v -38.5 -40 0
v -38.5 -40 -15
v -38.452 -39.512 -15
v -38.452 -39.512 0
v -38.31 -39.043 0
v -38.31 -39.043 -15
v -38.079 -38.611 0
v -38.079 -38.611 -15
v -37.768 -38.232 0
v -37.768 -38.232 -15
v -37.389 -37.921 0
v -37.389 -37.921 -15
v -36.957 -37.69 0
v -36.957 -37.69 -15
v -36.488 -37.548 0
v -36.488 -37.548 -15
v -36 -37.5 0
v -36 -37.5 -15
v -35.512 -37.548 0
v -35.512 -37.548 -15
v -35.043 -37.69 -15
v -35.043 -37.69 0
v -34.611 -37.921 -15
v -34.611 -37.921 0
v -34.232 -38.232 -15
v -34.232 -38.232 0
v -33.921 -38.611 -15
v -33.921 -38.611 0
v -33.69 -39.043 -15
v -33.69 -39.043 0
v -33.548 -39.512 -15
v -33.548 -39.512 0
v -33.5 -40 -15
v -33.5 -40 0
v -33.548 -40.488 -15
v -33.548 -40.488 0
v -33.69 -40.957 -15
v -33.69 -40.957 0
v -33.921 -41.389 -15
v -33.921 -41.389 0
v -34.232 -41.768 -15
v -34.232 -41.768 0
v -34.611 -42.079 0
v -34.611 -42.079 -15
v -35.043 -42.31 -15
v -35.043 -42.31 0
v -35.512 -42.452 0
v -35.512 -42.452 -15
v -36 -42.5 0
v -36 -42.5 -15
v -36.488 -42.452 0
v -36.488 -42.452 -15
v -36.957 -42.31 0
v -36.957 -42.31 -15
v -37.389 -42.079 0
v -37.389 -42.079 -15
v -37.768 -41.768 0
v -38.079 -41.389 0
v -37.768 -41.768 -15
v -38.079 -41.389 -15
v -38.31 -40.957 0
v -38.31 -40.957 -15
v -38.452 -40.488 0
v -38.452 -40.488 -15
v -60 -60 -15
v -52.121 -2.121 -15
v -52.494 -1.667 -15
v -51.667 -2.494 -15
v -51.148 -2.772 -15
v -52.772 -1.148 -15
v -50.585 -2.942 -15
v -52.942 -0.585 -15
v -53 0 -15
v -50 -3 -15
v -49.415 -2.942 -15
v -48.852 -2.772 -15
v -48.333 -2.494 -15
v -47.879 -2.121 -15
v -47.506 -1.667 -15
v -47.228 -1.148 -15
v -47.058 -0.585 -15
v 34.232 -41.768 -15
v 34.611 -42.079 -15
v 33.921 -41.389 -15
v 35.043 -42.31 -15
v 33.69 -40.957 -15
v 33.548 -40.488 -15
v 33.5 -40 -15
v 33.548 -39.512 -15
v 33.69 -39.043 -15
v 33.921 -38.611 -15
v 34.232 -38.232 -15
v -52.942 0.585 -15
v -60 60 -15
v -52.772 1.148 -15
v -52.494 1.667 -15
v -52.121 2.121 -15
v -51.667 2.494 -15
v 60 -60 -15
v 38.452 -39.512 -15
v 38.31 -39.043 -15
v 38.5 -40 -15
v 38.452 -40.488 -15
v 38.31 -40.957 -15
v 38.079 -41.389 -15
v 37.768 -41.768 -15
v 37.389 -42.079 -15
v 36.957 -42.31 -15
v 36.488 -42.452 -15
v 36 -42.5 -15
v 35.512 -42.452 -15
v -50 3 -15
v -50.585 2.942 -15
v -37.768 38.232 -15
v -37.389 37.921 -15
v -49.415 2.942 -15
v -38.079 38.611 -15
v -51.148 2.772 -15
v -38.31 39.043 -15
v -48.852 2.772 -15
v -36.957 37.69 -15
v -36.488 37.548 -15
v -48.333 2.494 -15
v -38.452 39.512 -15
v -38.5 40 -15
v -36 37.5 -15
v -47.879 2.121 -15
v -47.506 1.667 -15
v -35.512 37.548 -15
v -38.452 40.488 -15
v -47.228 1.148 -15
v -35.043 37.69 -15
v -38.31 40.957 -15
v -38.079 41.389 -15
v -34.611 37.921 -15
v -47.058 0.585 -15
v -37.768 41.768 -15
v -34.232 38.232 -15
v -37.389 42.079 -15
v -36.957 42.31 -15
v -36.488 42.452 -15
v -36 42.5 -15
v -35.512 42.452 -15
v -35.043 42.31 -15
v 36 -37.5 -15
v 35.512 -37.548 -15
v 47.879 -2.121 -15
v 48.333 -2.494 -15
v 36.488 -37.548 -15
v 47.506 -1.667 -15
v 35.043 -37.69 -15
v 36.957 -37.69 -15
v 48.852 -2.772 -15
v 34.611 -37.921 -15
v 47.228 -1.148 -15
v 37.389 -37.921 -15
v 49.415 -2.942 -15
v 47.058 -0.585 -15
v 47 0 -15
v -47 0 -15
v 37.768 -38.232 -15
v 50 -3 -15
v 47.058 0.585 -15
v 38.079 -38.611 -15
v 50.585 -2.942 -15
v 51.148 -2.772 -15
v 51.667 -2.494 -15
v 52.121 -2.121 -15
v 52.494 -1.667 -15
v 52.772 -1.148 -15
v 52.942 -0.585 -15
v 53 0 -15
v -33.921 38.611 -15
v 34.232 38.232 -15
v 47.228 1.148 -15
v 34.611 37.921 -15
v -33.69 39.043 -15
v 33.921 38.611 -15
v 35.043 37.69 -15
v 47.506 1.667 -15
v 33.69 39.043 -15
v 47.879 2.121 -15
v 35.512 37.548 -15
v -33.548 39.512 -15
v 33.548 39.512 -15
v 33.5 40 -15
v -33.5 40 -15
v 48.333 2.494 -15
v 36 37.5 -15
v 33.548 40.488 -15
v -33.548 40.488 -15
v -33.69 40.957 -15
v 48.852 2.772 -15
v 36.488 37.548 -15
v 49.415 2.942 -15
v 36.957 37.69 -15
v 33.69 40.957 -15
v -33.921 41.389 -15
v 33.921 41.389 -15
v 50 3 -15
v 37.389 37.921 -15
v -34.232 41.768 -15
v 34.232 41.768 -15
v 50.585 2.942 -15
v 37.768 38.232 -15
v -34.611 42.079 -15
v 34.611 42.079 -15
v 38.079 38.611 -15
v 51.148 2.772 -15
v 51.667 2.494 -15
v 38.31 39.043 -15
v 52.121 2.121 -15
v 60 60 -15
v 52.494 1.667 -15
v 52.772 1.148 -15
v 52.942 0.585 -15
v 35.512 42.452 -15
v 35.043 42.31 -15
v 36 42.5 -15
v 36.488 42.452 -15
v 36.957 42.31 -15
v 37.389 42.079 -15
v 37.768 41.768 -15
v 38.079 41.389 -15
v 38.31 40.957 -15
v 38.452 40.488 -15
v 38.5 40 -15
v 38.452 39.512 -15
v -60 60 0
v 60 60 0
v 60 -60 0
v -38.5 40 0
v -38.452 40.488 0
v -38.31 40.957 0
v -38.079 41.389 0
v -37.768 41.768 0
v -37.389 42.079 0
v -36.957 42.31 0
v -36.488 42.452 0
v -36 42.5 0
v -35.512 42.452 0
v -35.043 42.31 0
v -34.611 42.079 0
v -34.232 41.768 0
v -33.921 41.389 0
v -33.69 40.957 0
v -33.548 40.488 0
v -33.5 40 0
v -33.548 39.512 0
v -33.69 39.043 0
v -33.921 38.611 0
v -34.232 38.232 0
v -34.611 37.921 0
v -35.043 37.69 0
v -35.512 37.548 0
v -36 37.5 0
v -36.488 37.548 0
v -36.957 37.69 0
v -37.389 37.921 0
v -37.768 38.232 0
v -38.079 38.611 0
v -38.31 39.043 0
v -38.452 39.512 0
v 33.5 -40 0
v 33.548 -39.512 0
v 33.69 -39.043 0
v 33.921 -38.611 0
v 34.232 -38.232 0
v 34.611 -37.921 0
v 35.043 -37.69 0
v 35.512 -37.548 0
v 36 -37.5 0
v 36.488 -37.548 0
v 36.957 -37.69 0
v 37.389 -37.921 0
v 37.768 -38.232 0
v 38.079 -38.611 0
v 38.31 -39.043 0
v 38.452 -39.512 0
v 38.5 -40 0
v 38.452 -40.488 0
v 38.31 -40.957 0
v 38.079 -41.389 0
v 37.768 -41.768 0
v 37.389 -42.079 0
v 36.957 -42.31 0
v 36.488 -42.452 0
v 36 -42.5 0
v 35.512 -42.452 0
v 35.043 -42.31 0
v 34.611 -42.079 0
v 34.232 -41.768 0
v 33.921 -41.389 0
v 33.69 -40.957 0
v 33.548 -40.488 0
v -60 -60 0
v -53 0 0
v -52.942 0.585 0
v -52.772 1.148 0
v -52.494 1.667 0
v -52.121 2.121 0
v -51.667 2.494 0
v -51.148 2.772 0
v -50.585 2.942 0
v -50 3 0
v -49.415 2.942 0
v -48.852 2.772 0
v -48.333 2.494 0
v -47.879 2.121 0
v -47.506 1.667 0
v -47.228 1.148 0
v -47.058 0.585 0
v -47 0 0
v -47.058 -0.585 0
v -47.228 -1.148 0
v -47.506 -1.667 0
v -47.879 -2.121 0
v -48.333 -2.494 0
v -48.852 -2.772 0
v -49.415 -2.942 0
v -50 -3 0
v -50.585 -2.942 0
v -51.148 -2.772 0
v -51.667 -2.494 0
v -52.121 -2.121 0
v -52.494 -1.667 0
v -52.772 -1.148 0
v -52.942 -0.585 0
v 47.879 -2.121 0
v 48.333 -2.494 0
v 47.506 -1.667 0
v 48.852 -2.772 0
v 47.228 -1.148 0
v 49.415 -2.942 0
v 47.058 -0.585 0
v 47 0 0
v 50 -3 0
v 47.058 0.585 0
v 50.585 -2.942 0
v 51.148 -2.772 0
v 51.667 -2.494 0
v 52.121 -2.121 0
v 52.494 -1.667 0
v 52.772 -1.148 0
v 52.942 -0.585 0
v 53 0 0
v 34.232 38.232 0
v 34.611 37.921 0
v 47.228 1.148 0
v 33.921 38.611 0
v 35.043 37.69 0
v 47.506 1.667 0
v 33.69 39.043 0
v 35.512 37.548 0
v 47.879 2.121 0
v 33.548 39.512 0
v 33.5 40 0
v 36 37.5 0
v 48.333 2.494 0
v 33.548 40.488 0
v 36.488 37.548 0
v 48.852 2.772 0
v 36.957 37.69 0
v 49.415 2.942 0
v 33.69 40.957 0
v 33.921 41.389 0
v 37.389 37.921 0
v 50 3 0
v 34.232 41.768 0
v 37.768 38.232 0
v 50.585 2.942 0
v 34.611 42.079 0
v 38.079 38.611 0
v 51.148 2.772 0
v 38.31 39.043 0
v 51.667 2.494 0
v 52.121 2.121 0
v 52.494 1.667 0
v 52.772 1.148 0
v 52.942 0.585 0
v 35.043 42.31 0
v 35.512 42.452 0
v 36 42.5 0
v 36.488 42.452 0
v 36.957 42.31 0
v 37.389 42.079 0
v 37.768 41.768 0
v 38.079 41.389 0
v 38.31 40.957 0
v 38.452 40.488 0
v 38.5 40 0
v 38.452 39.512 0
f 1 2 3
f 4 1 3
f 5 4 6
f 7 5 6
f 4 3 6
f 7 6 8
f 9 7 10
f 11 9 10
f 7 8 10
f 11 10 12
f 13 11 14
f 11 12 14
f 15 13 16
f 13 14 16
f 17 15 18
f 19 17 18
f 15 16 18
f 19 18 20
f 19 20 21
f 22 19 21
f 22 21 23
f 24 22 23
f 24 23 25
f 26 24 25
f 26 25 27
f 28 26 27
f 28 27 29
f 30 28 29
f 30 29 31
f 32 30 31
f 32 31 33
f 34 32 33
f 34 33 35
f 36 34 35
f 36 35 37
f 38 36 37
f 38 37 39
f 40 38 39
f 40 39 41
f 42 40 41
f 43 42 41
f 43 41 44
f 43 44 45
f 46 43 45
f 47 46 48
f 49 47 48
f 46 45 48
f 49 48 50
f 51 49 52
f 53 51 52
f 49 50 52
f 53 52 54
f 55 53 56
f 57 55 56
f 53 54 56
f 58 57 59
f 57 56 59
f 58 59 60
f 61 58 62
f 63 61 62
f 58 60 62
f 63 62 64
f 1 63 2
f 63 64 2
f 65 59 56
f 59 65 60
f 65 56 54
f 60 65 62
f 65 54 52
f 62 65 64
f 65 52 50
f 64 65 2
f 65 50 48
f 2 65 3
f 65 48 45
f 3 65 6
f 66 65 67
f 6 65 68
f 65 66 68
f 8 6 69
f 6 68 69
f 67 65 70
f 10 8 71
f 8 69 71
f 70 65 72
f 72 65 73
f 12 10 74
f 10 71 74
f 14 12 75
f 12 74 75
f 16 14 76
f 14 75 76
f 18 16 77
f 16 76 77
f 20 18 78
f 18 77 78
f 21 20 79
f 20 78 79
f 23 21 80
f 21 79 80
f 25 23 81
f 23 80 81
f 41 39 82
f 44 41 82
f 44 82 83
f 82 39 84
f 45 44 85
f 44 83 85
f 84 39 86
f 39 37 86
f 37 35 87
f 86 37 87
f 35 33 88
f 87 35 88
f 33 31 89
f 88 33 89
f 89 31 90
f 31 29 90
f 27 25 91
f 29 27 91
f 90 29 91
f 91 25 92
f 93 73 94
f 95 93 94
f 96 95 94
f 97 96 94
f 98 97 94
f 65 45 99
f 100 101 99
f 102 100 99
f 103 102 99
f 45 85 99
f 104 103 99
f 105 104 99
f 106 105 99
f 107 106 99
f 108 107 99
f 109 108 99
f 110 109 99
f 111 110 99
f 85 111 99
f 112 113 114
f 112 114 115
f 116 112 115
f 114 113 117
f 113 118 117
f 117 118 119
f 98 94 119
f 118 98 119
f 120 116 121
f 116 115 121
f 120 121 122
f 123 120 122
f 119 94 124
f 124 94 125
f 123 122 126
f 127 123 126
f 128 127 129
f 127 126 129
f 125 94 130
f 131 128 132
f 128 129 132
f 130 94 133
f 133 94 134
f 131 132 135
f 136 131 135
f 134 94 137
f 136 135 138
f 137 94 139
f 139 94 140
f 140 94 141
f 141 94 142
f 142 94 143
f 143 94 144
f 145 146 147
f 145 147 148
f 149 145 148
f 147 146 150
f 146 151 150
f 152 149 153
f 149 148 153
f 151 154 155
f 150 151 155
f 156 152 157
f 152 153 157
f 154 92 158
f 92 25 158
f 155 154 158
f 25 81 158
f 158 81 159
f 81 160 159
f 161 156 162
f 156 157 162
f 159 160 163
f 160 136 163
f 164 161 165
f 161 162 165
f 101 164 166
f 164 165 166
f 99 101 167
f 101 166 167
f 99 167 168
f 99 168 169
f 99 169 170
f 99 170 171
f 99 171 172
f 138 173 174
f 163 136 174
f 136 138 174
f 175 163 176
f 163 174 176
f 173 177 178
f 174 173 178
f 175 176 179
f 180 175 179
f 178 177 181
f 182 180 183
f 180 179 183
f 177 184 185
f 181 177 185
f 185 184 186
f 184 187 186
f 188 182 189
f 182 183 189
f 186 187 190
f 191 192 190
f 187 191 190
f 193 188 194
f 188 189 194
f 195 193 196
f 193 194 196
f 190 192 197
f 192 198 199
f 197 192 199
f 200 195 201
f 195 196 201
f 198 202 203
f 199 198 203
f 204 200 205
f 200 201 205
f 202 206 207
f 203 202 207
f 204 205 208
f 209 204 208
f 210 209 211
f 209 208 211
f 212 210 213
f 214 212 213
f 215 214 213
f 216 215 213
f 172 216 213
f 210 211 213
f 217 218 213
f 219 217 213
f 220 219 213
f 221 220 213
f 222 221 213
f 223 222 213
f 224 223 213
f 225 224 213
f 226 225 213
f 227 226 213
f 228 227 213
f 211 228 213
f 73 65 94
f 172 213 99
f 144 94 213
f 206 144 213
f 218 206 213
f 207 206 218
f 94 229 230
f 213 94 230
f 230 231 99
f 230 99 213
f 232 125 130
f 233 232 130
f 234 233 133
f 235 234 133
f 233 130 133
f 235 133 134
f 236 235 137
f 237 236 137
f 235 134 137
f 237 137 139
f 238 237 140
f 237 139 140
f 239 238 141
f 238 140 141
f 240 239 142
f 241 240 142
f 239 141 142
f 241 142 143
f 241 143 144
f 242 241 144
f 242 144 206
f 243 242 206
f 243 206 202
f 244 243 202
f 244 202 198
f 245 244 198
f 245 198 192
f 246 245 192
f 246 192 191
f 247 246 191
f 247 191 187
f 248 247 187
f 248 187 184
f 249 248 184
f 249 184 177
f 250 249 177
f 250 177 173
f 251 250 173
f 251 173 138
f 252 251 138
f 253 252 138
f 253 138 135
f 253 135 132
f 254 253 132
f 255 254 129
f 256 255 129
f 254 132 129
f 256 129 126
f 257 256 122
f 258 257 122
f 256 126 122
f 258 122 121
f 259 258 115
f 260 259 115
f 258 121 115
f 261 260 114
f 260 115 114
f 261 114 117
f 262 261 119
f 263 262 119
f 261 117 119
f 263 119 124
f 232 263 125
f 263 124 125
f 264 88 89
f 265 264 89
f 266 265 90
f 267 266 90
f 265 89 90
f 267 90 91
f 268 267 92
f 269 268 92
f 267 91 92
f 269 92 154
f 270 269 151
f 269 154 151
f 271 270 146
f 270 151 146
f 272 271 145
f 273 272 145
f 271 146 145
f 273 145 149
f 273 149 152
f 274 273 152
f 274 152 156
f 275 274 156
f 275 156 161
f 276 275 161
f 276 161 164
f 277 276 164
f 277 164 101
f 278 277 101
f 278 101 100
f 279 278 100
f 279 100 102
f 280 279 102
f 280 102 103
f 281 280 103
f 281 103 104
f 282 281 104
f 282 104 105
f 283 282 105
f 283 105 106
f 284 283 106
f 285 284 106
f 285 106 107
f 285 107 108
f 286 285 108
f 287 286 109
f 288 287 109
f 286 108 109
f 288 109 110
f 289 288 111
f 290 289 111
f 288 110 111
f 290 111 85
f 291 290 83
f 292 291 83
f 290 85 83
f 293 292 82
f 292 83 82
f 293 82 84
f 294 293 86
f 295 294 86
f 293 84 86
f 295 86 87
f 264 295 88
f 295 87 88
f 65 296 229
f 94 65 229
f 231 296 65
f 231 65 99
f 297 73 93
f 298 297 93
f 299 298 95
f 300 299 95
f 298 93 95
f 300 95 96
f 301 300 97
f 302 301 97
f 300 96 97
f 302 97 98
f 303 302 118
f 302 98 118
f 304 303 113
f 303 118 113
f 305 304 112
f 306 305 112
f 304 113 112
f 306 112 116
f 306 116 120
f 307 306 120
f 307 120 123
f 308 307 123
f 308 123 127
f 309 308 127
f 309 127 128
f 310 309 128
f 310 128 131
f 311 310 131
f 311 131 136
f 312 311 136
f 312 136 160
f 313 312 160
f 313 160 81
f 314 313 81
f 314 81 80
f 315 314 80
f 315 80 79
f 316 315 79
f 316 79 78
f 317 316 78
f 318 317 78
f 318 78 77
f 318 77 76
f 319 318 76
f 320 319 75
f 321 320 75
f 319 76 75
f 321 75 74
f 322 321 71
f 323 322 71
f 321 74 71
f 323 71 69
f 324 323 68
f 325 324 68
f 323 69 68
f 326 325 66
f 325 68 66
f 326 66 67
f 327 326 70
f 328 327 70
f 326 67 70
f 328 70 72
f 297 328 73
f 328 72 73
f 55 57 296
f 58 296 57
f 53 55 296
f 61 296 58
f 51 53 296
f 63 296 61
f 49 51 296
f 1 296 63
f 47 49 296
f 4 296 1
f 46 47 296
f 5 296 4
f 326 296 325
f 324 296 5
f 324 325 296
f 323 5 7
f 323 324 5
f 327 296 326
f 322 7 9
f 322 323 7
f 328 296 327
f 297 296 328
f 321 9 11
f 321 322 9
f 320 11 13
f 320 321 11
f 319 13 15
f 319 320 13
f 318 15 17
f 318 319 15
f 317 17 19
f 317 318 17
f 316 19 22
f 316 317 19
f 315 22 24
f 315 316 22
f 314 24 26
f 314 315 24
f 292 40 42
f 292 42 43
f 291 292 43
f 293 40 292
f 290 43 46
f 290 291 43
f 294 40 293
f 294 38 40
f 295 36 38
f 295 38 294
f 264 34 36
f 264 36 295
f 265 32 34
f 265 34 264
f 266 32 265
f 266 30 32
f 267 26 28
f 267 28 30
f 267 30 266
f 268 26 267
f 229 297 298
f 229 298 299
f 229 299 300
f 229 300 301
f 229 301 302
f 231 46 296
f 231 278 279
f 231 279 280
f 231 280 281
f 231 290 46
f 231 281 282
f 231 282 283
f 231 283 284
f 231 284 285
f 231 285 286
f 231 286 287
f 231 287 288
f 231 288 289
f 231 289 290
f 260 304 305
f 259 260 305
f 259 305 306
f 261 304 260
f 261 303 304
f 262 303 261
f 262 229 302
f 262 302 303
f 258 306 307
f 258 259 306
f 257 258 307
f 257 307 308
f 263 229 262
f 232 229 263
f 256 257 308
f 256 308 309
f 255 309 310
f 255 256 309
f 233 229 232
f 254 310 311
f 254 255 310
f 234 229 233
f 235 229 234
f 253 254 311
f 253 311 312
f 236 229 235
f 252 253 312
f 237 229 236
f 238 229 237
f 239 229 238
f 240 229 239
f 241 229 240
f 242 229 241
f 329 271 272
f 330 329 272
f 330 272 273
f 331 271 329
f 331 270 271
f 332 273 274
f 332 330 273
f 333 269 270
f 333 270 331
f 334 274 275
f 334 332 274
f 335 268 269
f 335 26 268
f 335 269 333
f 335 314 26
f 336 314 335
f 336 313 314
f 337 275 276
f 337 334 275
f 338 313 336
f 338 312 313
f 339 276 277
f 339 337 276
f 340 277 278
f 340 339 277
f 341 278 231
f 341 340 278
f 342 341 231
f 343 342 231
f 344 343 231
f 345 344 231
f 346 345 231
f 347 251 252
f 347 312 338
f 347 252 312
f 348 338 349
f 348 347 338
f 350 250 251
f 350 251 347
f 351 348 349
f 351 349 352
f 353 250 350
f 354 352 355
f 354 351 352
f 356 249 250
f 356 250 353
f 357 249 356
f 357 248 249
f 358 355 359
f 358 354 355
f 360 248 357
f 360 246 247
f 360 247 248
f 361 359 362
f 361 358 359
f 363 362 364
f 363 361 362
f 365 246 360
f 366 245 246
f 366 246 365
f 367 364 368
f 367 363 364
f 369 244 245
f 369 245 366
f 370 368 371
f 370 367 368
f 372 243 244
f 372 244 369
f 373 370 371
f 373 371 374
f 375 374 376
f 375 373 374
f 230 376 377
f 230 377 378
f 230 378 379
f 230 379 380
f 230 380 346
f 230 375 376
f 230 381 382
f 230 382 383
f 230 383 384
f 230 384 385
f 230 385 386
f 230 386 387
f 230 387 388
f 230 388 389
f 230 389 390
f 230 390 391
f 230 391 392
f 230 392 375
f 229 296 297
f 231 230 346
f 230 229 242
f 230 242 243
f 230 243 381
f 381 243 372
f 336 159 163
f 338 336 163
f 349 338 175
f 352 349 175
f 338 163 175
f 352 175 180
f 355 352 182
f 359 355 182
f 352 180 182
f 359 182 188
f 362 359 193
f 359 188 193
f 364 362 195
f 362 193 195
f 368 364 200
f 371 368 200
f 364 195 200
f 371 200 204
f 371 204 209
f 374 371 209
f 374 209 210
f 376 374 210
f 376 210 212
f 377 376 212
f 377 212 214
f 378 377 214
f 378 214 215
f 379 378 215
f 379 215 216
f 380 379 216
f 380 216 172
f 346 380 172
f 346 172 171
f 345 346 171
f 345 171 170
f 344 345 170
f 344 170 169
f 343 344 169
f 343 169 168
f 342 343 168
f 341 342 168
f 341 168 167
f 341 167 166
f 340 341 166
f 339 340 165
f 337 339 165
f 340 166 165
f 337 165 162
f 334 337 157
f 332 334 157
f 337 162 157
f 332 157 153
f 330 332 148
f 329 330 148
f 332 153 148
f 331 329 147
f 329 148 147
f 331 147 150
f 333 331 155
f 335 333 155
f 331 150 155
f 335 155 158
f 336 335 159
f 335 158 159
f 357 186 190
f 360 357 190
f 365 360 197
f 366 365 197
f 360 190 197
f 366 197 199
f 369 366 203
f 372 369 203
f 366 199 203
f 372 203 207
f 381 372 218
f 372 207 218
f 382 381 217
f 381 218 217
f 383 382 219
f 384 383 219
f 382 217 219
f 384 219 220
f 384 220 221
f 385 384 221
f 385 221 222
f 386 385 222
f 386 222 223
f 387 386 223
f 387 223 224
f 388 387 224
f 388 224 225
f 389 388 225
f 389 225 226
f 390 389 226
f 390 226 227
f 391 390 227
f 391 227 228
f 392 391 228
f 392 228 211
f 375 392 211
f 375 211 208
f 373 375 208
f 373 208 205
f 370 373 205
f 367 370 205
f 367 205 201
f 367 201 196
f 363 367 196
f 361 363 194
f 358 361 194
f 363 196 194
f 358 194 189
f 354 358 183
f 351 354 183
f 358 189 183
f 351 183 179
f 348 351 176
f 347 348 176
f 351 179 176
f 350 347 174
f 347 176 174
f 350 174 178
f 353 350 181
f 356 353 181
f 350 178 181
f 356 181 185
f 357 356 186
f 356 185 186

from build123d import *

# Parameters (mm, degrees)
SKETCH1_W           = 120
SKETCH1_H           = 120
BOSS_EXTRUDE1_DEPTH = 15
CUT_EXTRUDE4_REACH  = 17
SKETCH7_R           = 2.5
SKETCH7_R_2         = 3


with BuildPart() as part:
    # Sketch1 → Boss-Extrude1 (new body)
    with BuildSketch(Plane.XY):
        Rectangle(SKETCH1_W, SKETCH1_H)
    extrude(amount=-BOSS_EXTRUDE1_DEPTH)

    # Sketch7 → Cut-Extrude4 (cut, up to next)
    with BuildSketch(Plane(origin=(0, 0, -15), x_dir=(-1, 0, 0), z_dir=(0, 0, -1)), mode=Mode.PRIVATE) as cut_extrude4_sk1:
        with Locations((-36, -40)):
            Circle(SKETCH7_R)
    cut_extrude4_tool1 = extrude(cut_extrude4_sk1.sketch, amount=-CUT_EXTRUDE4_REACH, mode=Mode.PRIVATE) & part.part
    add(cut_extrude4_tool1.solids().sort_by_distance((36, -40, -15))[0], mode=Mode.SUBTRACT)
    # Sketch7 → Cut-Extrude4 (cut, up to next)
    with BuildSketch(Plane(origin=(0, 0, -15), x_dir=(-1, 0, 0), z_dir=(0, 0, -1)), mode=Mode.PRIVATE) as cut_extrude4_sk2:
        with Locations((-36, 40)):
            Circle(SKETCH7_R)
    cut_extrude4_tool2 = extrude(cut_extrude4_sk2.sketch, amount=-CUT_EXTRUDE4_REACH, mode=Mode.PRIVATE) & part.part
    add(cut_extrude4_tool2.solids().sort_by_distance((36, 40, -15))[0], mode=Mode.SUBTRACT)
    # Sketch7 → Cut-Extrude4 (cut, up to next)
    with BuildSketch(Plane(origin=(0, 0, -15), x_dir=(-1, 0, 0), z_dir=(0, 0, -1)), mode=Mode.PRIVATE) as cut_extrude4_sk3:
        with Locations((36, -40)):
            Circle(SKETCH7_R)
    cut_extrude4_tool3 = extrude(cut_extrude4_sk3.sketch, amount=-CUT_EXTRUDE4_REACH, mode=Mode.PRIVATE) & part.part
    add(cut_extrude4_tool3.solids().sort_by_distance((-36, -40, -15))[0], mode=Mode.SUBTRACT)
    # Sketch7 → Cut-Extrude4 (cut, up to next)
    with BuildSketch(Plane(origin=(0, 0, -15), x_dir=(-1, 0, 0), z_dir=(0, 0, -1)), mode=Mode.PRIVATE) as cut_extrude4_sk4:
        with Locations((36, 40)):
            Circle(SKETCH7_R)
    cut_extrude4_tool4 = extrude(cut_extrude4_sk4.sketch, amount=-CUT_EXTRUDE4_REACH, mode=Mode.PRIVATE) & part.part
    add(cut_extrude4_tool4.solids().sort_by_distance((-36, 40, -15))[0], mode=Mode.SUBTRACT)
    # Sketch7 → Cut-Extrude4 (cut, up to next)
    with BuildSketch(Plane(origin=(0, 0, -15), x_dir=(-1, 0, 0), z_dir=(0, 0, -1)), mode=Mode.PRIVATE) as cut_extrude4_sk5:
        with Locations((50, 0)):
            Circle(SKETCH7_R_2)
    cut_extrude4_tool5 = extrude(cut_extrude4_sk5.sketch, amount=-CUT_EXTRUDE4_REACH, mode=Mode.PRIVATE) & part.part
    add(cut_extrude4_tool5.solids().sort_by_distance((-50, 0, -15))[0], mode=Mode.SUBTRACT)
    # Sketch7 → Cut-Extrude4 (cut, up to next)
    with BuildSketch(Plane(origin=(0, 0, -15), x_dir=(-1, 0, 0), z_dir=(0, 0, -1)), mode=Mode.PRIVATE) as cut_extrude4_sk6:
        with Locations((-50, 0)):
            Circle(SKETCH7_R_2)
    cut_extrude4_tool6 = extrude(cut_extrude4_sk6.sketch, amount=-CUT_EXTRUDE4_REACH, mode=Mode.PRIVATE) & part.part
    add(cut_extrude4_tool6.solids().sort_by_distance((50, 0, -15))[0], mode=Mode.SUBTRACT)


solid = part.part
